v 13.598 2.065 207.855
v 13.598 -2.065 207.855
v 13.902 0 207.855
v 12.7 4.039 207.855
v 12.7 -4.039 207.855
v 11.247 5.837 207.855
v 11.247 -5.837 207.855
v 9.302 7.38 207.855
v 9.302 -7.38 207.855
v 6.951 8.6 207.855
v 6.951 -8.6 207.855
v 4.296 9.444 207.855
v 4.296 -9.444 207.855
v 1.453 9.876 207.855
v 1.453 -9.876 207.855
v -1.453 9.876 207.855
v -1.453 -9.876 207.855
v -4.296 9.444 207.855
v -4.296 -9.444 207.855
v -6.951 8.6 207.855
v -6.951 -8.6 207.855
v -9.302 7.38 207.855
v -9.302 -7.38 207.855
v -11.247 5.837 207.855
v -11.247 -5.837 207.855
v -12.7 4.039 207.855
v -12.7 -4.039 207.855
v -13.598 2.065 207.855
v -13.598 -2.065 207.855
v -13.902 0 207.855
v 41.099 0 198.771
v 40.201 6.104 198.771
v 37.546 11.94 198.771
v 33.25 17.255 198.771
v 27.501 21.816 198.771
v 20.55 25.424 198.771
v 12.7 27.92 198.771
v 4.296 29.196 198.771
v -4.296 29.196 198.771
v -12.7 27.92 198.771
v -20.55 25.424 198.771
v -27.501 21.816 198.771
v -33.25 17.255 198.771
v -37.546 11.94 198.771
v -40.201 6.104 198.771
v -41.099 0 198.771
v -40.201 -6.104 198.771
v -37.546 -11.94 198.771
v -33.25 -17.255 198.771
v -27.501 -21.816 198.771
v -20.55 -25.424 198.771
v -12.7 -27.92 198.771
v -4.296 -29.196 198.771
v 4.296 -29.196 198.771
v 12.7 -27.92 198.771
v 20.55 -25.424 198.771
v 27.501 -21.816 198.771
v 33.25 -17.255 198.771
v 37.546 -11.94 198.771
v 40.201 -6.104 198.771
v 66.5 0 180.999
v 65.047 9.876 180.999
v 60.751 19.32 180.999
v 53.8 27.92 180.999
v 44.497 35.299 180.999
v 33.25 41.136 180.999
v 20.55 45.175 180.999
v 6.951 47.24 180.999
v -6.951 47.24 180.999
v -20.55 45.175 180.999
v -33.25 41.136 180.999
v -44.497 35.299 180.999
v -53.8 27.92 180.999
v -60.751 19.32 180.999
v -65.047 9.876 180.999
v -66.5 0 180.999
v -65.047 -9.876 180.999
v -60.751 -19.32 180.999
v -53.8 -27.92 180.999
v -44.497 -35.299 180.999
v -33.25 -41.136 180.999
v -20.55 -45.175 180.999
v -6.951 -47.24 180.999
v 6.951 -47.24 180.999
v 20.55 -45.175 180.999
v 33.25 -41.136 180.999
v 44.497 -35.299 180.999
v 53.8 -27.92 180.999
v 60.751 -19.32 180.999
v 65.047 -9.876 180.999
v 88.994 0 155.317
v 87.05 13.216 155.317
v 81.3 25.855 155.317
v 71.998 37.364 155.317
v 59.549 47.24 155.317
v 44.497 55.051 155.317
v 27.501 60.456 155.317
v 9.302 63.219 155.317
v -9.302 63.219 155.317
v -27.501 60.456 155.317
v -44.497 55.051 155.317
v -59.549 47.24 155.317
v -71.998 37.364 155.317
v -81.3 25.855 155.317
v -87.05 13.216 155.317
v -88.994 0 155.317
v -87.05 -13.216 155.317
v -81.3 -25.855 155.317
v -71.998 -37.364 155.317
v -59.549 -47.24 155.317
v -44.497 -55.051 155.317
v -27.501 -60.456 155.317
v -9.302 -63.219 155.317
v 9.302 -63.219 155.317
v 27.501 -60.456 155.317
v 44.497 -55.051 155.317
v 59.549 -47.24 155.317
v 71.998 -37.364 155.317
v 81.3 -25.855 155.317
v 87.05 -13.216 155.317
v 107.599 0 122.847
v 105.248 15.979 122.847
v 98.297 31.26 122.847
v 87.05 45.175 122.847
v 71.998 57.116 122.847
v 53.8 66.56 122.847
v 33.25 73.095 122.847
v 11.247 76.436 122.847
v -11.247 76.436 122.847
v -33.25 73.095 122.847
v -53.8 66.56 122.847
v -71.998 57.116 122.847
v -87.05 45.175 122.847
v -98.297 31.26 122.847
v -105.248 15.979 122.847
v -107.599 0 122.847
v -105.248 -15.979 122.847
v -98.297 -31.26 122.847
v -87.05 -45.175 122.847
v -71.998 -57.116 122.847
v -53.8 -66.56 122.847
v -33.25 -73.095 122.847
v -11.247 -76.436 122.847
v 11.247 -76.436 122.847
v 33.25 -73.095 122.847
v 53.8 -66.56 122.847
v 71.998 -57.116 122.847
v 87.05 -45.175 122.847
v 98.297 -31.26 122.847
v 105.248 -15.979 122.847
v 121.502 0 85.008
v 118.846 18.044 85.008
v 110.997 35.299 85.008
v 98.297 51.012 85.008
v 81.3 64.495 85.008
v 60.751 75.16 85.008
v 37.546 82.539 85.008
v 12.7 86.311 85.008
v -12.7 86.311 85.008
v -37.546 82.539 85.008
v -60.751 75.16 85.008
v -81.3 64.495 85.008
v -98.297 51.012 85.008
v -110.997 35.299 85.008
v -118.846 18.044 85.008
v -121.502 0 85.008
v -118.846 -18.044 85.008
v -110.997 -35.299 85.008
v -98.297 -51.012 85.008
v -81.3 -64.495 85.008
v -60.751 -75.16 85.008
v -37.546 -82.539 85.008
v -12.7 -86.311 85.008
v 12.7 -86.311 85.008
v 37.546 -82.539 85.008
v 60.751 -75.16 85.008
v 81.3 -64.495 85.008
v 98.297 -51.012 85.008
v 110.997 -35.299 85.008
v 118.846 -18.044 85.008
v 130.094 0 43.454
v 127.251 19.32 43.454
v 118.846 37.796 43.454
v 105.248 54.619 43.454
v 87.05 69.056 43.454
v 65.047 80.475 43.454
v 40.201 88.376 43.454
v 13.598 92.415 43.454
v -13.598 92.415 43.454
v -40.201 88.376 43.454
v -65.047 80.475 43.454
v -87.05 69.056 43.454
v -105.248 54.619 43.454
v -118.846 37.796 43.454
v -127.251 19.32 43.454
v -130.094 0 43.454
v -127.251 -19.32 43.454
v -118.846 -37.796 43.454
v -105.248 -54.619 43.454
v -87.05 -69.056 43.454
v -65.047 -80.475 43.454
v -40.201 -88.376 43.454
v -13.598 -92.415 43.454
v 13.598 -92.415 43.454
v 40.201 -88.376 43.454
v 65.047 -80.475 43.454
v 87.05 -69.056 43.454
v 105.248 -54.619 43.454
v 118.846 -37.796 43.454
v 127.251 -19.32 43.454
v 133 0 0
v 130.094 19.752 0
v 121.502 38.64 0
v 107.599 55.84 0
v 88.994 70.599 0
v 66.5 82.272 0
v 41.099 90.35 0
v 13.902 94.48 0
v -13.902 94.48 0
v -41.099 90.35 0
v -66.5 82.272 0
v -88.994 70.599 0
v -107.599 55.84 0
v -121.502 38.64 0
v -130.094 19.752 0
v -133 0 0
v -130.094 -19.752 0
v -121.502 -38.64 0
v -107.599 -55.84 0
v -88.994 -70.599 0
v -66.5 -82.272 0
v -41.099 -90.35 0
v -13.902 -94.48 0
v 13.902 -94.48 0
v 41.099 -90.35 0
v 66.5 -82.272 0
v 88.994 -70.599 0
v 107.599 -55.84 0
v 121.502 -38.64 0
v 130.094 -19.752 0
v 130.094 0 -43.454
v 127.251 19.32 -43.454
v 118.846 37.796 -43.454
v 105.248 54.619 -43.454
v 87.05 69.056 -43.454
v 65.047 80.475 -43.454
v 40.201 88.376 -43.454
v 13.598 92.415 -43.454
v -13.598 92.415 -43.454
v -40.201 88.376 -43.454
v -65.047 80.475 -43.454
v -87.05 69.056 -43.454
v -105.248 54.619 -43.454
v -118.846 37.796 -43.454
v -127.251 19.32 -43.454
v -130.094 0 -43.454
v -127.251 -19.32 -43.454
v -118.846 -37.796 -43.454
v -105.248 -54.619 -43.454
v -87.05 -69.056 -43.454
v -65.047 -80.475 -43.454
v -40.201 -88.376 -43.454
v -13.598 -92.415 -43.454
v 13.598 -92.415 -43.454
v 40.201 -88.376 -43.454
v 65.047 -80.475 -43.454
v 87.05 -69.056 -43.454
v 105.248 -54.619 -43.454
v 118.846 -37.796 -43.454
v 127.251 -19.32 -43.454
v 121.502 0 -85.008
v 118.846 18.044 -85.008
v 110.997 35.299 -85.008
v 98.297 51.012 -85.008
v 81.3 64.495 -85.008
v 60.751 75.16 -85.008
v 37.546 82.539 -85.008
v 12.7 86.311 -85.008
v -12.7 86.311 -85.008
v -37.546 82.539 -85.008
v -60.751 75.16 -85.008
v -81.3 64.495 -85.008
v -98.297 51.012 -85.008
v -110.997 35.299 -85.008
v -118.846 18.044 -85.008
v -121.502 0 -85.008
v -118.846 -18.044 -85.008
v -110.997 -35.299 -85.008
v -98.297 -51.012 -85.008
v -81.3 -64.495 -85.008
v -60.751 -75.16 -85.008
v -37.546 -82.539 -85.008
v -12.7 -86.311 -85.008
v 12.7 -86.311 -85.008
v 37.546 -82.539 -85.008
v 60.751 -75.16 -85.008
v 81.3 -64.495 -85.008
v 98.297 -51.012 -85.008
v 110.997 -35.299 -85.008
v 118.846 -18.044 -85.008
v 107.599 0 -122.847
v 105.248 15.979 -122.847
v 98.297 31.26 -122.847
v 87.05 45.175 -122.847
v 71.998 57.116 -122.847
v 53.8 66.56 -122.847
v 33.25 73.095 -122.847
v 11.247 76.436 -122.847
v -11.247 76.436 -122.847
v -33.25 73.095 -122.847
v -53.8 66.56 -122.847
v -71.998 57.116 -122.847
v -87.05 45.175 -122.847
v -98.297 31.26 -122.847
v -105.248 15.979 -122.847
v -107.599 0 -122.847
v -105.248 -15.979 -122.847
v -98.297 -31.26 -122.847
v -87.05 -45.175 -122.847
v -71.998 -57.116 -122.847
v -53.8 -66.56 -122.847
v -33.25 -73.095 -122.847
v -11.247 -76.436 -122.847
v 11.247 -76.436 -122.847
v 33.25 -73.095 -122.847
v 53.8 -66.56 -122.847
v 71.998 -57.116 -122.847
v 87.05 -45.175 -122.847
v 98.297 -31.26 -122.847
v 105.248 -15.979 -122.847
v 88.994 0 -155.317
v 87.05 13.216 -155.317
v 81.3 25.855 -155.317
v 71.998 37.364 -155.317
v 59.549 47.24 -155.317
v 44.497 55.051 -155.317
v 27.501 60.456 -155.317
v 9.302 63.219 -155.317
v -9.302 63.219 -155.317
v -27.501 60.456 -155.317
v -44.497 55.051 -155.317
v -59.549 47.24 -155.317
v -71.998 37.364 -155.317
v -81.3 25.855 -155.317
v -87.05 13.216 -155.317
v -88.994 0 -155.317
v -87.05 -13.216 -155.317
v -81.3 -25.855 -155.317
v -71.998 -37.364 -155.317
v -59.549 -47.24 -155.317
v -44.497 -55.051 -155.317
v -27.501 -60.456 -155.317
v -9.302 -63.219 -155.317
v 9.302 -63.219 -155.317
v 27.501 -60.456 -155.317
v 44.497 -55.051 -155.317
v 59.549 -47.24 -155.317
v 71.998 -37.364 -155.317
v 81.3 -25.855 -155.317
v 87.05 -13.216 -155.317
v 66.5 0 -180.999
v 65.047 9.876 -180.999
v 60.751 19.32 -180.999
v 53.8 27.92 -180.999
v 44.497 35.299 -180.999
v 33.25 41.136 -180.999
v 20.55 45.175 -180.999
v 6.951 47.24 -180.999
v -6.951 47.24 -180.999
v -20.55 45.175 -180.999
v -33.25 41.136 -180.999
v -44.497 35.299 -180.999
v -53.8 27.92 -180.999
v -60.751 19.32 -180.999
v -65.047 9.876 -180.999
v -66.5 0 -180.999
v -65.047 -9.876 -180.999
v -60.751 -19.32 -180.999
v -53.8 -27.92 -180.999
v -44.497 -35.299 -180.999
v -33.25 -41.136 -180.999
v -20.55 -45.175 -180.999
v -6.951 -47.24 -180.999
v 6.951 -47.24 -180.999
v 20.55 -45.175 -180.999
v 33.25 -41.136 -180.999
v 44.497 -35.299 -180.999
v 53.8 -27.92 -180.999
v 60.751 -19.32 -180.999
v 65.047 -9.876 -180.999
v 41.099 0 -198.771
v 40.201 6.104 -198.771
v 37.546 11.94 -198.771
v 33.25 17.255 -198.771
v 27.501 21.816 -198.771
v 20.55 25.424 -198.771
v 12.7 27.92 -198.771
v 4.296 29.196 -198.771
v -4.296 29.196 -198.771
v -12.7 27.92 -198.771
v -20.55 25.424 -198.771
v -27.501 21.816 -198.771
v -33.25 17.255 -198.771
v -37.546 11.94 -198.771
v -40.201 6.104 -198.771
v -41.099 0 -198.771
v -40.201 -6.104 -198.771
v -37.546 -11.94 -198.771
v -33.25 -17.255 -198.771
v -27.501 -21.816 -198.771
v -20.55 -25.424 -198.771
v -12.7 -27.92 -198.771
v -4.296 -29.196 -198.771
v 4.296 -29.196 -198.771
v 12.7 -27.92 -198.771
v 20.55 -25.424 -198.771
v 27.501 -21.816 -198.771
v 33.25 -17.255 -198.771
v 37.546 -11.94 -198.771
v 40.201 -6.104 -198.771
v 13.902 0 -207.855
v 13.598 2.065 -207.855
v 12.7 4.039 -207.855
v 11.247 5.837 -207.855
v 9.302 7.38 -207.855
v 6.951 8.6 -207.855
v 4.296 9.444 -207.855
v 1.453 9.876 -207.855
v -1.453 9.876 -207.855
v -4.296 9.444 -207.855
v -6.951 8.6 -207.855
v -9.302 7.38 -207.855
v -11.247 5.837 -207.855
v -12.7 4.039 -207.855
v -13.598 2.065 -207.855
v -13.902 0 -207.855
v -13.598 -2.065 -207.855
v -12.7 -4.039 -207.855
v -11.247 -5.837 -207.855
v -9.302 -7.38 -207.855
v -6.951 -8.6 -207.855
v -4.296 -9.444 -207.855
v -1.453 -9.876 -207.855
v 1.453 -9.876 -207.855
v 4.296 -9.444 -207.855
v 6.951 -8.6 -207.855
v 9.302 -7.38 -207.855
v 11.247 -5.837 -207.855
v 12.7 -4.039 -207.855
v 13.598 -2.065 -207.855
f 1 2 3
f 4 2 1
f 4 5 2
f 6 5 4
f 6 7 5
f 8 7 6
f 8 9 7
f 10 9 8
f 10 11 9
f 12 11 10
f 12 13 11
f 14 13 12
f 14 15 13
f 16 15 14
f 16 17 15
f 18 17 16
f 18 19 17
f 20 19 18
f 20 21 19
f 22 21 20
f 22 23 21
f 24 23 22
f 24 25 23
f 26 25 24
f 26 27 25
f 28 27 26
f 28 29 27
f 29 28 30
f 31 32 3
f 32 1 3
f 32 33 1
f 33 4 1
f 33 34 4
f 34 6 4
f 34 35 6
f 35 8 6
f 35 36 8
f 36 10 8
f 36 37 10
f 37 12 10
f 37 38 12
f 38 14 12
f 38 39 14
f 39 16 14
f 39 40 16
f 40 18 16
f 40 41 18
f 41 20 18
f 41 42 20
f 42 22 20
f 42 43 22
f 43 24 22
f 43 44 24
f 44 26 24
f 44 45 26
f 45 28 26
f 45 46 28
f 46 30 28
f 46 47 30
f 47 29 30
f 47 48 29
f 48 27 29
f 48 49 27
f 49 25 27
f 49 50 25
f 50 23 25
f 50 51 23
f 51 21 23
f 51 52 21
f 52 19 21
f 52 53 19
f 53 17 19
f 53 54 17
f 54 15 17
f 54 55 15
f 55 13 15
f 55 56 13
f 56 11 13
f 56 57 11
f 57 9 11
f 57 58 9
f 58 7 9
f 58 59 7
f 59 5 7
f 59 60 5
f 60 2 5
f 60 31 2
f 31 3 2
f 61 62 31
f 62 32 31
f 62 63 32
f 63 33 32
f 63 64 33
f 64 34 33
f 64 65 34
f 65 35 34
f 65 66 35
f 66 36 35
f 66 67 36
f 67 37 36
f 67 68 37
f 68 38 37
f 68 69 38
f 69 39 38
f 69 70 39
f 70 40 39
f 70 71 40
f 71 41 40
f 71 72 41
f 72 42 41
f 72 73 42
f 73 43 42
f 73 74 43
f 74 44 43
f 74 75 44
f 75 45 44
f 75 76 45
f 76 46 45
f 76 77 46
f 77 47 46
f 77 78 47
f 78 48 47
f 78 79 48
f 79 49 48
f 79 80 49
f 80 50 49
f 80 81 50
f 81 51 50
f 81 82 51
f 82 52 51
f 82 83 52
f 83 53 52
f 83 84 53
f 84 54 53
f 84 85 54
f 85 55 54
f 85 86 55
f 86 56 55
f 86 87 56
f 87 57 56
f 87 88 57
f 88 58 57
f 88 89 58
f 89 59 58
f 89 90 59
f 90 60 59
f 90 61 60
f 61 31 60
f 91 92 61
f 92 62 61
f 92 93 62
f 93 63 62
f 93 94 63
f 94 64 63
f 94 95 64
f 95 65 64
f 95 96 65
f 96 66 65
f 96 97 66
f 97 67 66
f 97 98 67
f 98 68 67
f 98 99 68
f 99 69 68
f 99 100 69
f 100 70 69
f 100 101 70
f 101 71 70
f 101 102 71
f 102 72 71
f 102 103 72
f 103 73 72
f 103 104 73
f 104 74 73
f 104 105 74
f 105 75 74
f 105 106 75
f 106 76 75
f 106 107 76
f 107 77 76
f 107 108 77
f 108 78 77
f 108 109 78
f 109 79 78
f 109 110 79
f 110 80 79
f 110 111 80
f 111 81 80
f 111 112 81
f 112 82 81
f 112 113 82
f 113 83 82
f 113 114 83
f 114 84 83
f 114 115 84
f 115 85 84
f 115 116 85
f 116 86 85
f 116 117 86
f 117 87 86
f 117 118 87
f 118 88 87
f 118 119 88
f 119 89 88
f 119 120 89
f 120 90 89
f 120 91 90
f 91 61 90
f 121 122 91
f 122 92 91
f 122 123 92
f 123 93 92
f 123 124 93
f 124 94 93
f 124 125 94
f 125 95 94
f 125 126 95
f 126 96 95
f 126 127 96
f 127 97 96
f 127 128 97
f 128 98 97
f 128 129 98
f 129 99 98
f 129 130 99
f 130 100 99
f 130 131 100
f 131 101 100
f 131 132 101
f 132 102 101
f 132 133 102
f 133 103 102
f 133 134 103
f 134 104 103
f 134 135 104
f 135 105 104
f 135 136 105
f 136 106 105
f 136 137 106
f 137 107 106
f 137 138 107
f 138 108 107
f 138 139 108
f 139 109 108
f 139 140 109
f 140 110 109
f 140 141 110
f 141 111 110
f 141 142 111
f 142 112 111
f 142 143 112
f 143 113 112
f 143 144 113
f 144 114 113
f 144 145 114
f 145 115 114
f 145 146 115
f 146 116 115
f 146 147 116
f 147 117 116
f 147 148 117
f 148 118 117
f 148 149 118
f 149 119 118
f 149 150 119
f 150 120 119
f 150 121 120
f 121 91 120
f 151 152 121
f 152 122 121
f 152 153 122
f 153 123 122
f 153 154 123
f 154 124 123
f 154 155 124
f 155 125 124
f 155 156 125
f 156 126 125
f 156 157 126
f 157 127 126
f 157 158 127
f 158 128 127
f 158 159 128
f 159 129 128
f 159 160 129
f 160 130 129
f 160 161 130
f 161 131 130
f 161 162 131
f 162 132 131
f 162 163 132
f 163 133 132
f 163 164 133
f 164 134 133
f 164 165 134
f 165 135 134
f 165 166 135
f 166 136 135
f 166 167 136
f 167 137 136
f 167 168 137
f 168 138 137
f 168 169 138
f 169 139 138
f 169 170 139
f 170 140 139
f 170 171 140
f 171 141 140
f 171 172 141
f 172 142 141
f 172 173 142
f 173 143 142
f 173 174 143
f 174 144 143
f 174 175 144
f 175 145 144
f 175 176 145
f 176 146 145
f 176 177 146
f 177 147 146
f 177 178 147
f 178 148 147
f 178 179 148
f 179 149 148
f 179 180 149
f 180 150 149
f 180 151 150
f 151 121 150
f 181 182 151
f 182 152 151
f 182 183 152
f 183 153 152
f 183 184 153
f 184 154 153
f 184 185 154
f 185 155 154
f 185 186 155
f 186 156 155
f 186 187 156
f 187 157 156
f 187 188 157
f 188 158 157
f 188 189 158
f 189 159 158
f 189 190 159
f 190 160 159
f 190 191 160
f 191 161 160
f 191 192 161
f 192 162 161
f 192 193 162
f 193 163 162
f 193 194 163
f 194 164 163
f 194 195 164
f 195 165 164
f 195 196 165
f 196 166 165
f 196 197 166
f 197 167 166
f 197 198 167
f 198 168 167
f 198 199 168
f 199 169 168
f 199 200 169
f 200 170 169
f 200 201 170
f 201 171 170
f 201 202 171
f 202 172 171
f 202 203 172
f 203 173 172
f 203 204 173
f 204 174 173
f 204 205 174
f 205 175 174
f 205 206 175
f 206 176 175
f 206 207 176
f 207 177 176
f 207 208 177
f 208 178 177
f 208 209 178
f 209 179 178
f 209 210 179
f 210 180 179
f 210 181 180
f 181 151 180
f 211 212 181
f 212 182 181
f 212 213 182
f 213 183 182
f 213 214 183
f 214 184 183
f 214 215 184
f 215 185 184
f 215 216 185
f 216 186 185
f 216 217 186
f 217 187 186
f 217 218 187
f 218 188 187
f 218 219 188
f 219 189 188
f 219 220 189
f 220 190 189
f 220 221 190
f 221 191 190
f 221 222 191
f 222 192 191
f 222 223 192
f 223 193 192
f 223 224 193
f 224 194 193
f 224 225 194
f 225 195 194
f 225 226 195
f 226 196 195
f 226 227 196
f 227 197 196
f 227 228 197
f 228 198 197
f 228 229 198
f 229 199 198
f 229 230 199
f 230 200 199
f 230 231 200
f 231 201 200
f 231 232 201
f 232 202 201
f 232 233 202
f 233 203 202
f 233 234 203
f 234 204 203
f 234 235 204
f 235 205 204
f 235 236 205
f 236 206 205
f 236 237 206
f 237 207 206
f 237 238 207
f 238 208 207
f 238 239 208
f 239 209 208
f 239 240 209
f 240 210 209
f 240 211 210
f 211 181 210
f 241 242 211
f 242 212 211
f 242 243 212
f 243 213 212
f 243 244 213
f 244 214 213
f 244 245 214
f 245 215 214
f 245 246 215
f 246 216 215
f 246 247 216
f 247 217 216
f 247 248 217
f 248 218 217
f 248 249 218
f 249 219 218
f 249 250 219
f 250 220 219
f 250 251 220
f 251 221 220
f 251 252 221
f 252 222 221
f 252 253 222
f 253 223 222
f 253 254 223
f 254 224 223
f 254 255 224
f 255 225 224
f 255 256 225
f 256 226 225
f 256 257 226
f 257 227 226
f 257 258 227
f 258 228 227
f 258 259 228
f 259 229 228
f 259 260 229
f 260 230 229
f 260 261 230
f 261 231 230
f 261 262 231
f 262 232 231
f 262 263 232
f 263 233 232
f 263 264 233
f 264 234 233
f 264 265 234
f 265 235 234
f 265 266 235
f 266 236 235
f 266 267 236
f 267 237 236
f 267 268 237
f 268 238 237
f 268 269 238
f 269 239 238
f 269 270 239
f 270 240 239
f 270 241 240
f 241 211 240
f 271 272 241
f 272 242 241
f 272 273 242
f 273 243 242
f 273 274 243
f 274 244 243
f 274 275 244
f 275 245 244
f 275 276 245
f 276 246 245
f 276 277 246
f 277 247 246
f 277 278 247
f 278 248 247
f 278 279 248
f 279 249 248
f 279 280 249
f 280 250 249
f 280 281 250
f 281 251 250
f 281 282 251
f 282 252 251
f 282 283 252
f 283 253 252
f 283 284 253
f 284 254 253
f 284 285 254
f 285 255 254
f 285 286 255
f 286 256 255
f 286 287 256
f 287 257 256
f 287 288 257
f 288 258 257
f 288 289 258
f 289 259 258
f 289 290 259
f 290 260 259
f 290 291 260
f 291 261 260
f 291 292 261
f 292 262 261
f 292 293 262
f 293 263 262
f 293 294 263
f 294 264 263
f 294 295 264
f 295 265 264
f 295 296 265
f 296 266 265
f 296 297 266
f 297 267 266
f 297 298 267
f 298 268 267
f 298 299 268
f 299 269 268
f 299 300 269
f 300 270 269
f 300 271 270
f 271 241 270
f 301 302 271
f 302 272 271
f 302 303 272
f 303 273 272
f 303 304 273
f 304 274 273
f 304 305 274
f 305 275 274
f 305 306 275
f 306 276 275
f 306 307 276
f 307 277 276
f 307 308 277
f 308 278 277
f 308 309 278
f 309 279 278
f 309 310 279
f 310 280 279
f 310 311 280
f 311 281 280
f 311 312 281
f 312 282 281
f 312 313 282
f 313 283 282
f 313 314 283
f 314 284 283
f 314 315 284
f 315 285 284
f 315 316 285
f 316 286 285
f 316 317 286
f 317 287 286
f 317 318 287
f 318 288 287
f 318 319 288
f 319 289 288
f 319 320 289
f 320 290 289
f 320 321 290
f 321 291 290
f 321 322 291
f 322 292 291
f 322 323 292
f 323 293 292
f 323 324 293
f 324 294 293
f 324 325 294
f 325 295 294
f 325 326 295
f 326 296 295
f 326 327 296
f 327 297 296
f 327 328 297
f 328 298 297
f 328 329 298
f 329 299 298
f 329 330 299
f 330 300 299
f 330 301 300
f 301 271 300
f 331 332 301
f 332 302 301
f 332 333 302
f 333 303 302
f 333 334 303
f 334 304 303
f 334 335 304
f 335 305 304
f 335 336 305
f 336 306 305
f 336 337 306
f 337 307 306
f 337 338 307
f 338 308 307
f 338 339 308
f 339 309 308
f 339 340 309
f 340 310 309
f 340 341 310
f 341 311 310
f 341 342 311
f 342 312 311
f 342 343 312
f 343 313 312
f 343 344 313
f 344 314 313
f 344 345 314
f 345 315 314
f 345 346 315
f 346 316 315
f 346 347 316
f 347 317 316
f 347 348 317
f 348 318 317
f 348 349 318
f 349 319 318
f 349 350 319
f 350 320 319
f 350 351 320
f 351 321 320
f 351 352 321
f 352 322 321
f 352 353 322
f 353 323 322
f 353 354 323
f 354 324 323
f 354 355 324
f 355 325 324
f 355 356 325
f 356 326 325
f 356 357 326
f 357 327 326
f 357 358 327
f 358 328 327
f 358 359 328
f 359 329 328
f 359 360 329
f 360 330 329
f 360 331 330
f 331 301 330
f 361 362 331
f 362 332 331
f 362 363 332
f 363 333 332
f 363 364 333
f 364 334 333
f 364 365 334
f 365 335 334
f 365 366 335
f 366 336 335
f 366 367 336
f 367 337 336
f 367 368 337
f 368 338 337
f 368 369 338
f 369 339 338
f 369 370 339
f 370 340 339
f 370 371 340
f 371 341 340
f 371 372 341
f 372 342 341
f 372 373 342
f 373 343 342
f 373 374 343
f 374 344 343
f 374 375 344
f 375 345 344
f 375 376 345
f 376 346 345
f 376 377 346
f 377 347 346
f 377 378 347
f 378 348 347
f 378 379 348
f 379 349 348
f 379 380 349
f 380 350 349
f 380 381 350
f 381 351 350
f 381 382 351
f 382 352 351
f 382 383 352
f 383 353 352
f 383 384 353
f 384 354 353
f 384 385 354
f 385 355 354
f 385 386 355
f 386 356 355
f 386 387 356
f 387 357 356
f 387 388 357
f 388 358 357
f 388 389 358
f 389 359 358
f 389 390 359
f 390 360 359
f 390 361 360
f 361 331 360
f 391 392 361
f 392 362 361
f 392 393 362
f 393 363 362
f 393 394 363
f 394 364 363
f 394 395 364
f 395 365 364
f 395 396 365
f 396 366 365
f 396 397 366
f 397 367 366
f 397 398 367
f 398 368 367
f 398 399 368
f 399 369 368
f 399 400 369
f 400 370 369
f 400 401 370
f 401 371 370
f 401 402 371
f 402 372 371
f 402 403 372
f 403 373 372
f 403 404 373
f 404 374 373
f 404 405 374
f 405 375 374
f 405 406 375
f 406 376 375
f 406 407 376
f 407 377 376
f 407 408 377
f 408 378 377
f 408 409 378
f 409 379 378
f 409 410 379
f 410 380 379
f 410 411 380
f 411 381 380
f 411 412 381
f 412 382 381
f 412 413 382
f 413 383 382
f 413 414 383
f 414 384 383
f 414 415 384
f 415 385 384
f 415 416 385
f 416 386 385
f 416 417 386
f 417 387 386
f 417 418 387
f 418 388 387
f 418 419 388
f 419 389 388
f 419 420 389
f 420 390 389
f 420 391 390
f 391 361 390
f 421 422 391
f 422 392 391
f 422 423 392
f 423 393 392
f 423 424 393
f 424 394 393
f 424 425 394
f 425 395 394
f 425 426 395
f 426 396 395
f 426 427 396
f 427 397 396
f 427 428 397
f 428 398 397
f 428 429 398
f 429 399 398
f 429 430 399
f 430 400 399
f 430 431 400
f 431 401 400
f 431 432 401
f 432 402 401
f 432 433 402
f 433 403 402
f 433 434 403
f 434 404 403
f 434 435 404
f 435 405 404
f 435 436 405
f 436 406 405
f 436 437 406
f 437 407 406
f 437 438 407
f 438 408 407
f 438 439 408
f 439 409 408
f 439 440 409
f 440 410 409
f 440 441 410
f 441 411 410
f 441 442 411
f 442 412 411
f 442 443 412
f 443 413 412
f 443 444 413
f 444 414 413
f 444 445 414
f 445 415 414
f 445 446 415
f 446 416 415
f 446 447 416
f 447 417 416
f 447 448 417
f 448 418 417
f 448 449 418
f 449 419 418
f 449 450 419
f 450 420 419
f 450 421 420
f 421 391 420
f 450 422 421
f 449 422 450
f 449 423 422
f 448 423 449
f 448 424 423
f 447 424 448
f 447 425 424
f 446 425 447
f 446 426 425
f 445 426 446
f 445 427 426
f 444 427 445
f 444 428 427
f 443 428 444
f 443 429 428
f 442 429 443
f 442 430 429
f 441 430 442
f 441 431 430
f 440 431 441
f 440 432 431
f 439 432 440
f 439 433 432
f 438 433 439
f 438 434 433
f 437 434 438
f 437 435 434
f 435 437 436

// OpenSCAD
// Generated by SolidPython 1.0.1 on 2020-07-29 00:46:47


scale(v = [7, 5, 11]) {
	sphere(r = 19);
}
/***********************************************
*********      SolidPython code:      **********
************************************************
 
# import packages: SolidPython
from solid import *
from solid.utils import *
from itertools import chain, combinations, permutations


class Resize:

    def __init__(self, scad_file):
        self.scad_file = scad_file
        #self.scad_file = import_scad(scad_file)
        # cone/cylinder param:
        self.r1 = 0
        self.r2 = 0
        self.h = 0
        # rectangular prism param:
        self.w = 0
        self.l = 0
        # ellipse param:
        self.r = 0

    # import OpenScad code (file name corresponds to shape)


    # classify shape + parameters
    def assign(self, param1, param2, param3):
        if self.scad_file == 'cone.scad':
            self.r1 = param1
            self.r2 = param2
            self.h = param3
        elif self.scad_file == 'cylinder.scad':
            self.r1 = param1
            self.r2 = param2
            self.h = param3
        elif self.scad_file == 'rectangularPrism.scad':
            self.h = param1
            self.l = param2
            self.w = param3
        else:
            self.r = param1
            self.h = param2

    # resize parameters
    def iterate(self):
        x = range(3, 20, 2)
        i = 1
        if self.scad_file == 'cone.scad':
            tempList = list(permutations(x, 2))
            for temp in tempList:
                param1 = temp[0]
                param2 = temp[1]
                filepath = 'produced_scad_files/' + 'cone' + str(param1) + '_' + str(param2) + '_' + '.scad'
                scad_render_to_file(cylinder(h=param1, r1=param2, r2=0), filepath)

        elif self.scad_file == 'cylinder.scad':
            tempList = list(permutations(x, 3))
            for temp in tempList:
                param1 = temp[0]
                param2 = temp[1]
                filepath = 'produced_scad_files/' + 'cylinder' + str(param1) + '_' + str(param2) + '_' + '.scad'
                scad_render_to_file(cylinder(h=param1, r1=param2, r2=param2), filepath)

        elif self.scad_file == 'rectangularPrism.scad':
            tempList = list(permutations(x, 3))
            for temp in tempList:
                param1 = temp[0]
                param2 = temp[1]
                param3 = temp[2]
                filepath = 'produced_scad_files/' + 'rectangularPrism' + str(param1) + '_' + str(param2) + '_' + str(
                    param3) + '.scad'
                scad_render_to_file(cube(size=(param1, param2, param3)), filepath)

        elif self.scad_file == 'ellipse.scad':
            tempList = list(permutations(x, 4))
            for temp in tempList:
                param1 = temp[0]
                param2 = temp[1]
                param3 = temp[2]
                param4 = temp[3]
                filepath = 'produced_scad_files/' + 'ellipse' + str(param1) + '_' + str(param2) + '_' + str(param3) + '_' + str(param4) + '.scad'
                scad_render_to_file(scale([param1, param2, param3])(sphere(r=param4)), filepath)

    def render_to_scadfile(self):
        scad_render_to_file(scad, 'example.scad') 
 
************************************************/
